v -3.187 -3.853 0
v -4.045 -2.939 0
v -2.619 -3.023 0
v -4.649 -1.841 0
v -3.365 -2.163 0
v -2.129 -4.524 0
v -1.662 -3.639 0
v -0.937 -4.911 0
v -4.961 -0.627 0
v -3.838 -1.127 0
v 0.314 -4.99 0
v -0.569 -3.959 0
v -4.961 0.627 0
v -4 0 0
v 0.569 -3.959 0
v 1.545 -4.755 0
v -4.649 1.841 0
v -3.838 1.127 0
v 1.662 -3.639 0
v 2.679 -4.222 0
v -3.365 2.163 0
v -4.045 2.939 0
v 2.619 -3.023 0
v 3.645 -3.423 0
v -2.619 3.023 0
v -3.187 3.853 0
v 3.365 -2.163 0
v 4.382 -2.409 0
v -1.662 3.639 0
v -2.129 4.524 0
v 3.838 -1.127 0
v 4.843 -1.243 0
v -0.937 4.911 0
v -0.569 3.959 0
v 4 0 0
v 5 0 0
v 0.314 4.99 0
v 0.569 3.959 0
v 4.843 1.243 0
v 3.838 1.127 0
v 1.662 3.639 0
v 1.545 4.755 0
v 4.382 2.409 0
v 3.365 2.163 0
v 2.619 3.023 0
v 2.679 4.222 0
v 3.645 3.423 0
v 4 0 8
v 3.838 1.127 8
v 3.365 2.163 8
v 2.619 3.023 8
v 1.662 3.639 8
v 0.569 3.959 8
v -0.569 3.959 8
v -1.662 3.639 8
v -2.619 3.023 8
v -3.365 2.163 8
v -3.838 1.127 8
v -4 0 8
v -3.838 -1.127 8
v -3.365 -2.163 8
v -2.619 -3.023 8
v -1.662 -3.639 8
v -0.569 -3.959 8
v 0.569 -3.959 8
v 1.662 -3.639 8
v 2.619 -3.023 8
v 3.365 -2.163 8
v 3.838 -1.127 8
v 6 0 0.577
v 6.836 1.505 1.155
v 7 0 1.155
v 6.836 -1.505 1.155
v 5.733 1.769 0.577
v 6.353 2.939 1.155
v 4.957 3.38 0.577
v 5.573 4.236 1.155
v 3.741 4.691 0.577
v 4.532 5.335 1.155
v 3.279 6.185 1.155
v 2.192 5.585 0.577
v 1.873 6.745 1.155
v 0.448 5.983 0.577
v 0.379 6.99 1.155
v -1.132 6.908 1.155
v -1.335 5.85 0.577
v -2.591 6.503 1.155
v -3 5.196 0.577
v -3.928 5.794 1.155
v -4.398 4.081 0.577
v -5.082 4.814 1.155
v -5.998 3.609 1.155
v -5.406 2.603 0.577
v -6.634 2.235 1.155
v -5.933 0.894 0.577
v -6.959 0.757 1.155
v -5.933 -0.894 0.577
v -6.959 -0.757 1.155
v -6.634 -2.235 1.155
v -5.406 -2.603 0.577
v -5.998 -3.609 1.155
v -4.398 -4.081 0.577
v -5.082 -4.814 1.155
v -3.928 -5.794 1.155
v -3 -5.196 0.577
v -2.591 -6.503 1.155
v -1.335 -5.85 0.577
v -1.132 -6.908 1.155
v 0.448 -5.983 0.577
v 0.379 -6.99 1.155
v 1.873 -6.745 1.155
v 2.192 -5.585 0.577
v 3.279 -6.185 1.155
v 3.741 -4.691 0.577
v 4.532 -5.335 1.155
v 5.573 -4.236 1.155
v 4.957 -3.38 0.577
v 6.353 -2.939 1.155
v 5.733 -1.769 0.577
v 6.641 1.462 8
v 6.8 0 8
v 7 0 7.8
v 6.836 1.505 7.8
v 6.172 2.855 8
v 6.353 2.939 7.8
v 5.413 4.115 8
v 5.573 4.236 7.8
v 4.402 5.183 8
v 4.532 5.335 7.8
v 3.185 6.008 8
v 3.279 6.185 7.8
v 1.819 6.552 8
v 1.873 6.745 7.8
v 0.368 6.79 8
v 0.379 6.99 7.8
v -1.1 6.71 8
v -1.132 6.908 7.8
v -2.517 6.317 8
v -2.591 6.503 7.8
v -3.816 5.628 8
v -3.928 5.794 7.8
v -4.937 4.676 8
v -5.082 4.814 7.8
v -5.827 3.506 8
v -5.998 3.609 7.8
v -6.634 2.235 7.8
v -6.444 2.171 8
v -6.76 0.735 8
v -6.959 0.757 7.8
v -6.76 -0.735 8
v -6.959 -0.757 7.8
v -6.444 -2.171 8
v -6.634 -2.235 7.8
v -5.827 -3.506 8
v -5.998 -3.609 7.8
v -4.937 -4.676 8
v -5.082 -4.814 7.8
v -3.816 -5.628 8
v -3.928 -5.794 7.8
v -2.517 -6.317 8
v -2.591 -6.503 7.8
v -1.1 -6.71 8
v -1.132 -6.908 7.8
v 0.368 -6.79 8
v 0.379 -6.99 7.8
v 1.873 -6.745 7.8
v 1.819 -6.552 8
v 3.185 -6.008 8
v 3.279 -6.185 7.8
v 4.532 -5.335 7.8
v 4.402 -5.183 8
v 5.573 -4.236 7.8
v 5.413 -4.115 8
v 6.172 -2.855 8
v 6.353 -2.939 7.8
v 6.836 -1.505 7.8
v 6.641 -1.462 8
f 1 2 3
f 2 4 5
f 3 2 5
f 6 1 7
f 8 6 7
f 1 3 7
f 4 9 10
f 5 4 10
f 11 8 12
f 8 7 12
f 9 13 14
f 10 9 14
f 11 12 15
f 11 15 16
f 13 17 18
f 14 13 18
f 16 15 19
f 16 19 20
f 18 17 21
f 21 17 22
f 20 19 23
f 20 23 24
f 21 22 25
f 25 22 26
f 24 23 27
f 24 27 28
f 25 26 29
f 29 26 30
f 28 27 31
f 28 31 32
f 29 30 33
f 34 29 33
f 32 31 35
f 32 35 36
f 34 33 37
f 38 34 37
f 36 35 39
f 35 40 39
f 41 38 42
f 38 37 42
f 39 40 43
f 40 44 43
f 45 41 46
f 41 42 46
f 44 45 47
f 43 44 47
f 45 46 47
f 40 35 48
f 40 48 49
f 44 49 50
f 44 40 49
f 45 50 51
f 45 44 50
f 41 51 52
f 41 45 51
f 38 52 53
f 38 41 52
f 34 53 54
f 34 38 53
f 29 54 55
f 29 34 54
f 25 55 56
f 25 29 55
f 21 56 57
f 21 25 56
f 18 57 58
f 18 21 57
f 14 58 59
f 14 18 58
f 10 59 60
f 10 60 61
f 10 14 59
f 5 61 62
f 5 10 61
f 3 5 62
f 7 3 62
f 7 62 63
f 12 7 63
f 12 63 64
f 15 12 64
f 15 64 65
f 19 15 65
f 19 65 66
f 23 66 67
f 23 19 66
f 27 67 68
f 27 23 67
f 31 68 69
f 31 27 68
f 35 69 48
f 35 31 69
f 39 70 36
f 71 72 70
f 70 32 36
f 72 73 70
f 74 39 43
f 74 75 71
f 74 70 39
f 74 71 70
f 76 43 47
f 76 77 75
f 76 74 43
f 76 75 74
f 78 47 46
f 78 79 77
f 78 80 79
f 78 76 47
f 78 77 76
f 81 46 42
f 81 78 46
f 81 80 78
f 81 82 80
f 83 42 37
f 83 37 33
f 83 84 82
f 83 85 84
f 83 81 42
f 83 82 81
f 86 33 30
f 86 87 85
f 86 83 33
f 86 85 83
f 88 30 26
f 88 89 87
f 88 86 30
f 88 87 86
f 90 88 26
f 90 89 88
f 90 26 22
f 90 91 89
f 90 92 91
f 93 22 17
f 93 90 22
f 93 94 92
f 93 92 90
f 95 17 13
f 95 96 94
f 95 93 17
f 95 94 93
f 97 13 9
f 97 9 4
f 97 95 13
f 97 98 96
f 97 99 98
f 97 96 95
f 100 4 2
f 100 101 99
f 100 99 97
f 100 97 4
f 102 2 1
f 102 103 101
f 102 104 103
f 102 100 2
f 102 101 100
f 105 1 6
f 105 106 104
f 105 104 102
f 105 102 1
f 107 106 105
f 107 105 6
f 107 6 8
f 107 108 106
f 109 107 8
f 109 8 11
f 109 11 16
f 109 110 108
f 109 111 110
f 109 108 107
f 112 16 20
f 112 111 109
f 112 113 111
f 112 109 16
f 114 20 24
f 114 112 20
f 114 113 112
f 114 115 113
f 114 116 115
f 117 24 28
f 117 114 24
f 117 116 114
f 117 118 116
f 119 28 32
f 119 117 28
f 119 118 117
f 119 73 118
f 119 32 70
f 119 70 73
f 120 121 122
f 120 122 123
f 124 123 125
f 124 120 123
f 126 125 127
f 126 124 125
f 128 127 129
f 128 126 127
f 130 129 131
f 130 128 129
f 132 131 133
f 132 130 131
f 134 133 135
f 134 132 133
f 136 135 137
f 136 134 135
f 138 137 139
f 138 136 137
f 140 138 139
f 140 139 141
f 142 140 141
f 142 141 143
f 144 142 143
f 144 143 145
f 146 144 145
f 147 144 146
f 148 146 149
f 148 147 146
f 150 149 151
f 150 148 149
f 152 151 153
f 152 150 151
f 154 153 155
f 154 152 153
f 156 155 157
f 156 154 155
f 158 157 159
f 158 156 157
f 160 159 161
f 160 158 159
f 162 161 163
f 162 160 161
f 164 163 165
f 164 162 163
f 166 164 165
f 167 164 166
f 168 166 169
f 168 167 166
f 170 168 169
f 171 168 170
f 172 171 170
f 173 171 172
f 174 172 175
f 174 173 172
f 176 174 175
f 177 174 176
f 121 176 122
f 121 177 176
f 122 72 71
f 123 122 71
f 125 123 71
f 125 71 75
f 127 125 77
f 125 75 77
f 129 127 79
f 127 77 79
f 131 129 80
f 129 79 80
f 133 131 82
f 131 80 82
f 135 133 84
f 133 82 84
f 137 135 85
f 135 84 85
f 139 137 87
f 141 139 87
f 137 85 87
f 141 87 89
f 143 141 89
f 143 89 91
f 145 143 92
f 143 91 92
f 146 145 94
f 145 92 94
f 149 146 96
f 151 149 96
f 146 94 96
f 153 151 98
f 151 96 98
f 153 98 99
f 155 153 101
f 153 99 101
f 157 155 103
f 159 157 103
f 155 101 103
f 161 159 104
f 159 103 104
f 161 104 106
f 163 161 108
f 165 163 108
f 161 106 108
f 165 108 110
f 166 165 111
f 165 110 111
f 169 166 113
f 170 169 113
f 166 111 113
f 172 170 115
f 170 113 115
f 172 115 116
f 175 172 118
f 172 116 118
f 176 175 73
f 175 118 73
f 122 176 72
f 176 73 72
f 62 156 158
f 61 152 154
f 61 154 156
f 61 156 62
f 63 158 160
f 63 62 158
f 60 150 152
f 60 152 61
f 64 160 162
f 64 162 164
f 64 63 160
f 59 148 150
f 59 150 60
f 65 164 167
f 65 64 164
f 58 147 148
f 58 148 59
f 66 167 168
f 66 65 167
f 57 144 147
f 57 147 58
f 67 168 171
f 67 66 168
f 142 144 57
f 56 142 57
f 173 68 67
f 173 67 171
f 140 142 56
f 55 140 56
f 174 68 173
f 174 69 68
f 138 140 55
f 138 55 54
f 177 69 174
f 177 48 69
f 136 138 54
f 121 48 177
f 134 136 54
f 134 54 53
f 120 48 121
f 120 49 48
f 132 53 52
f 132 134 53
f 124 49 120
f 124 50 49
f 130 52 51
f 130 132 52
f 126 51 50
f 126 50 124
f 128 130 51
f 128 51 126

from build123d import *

# Parameters (mm, degrees)
SKETCH1_R           = 7
SKETCH1_R_2         = 4
BOSS_EXTRUDE1_DEPTH = 8
CHAMFER1_SIZE       = 0.2
CHAMFER2_SIZE       = 2
CHAMFER2_SIZE2      = 1.154700538


with BuildPart() as part:
    # Sketch1 → Boss-Extrude1 (new body)
    with BuildSketch(Plane.XY):
        Circle(SKETCH1_R)
        Circle(SKETCH1_R_2, mode=Mode.SUBTRACT)
    extrude(amount=BOSS_EXTRUDE1_DEPTH)

    # Chamfer1
    chamfer1_edges = [part.edges().sort_by_distance(p)[0] for p in [
        (-7, 0, 8),
    ]]
    chamfer(chamfer1_edges, length=CHAMFER1_SIZE)

    # Chamfer2
    chamfer2_edges = [part.edges().sort_by_distance(p)[0] for p in [
        (-7, 0, 0),
    ]]
    chamfer2_side = [part.faces().sort_by_distance(p)[0] for p in [
        (-6.802010101, 0, 0),
    ]]
    chamfer(chamfer2_edges, length=CHAMFER2_SIZE, length2=CHAMFER2_SIZE2, reference=chamfer2_side[0])


solid = part.part
